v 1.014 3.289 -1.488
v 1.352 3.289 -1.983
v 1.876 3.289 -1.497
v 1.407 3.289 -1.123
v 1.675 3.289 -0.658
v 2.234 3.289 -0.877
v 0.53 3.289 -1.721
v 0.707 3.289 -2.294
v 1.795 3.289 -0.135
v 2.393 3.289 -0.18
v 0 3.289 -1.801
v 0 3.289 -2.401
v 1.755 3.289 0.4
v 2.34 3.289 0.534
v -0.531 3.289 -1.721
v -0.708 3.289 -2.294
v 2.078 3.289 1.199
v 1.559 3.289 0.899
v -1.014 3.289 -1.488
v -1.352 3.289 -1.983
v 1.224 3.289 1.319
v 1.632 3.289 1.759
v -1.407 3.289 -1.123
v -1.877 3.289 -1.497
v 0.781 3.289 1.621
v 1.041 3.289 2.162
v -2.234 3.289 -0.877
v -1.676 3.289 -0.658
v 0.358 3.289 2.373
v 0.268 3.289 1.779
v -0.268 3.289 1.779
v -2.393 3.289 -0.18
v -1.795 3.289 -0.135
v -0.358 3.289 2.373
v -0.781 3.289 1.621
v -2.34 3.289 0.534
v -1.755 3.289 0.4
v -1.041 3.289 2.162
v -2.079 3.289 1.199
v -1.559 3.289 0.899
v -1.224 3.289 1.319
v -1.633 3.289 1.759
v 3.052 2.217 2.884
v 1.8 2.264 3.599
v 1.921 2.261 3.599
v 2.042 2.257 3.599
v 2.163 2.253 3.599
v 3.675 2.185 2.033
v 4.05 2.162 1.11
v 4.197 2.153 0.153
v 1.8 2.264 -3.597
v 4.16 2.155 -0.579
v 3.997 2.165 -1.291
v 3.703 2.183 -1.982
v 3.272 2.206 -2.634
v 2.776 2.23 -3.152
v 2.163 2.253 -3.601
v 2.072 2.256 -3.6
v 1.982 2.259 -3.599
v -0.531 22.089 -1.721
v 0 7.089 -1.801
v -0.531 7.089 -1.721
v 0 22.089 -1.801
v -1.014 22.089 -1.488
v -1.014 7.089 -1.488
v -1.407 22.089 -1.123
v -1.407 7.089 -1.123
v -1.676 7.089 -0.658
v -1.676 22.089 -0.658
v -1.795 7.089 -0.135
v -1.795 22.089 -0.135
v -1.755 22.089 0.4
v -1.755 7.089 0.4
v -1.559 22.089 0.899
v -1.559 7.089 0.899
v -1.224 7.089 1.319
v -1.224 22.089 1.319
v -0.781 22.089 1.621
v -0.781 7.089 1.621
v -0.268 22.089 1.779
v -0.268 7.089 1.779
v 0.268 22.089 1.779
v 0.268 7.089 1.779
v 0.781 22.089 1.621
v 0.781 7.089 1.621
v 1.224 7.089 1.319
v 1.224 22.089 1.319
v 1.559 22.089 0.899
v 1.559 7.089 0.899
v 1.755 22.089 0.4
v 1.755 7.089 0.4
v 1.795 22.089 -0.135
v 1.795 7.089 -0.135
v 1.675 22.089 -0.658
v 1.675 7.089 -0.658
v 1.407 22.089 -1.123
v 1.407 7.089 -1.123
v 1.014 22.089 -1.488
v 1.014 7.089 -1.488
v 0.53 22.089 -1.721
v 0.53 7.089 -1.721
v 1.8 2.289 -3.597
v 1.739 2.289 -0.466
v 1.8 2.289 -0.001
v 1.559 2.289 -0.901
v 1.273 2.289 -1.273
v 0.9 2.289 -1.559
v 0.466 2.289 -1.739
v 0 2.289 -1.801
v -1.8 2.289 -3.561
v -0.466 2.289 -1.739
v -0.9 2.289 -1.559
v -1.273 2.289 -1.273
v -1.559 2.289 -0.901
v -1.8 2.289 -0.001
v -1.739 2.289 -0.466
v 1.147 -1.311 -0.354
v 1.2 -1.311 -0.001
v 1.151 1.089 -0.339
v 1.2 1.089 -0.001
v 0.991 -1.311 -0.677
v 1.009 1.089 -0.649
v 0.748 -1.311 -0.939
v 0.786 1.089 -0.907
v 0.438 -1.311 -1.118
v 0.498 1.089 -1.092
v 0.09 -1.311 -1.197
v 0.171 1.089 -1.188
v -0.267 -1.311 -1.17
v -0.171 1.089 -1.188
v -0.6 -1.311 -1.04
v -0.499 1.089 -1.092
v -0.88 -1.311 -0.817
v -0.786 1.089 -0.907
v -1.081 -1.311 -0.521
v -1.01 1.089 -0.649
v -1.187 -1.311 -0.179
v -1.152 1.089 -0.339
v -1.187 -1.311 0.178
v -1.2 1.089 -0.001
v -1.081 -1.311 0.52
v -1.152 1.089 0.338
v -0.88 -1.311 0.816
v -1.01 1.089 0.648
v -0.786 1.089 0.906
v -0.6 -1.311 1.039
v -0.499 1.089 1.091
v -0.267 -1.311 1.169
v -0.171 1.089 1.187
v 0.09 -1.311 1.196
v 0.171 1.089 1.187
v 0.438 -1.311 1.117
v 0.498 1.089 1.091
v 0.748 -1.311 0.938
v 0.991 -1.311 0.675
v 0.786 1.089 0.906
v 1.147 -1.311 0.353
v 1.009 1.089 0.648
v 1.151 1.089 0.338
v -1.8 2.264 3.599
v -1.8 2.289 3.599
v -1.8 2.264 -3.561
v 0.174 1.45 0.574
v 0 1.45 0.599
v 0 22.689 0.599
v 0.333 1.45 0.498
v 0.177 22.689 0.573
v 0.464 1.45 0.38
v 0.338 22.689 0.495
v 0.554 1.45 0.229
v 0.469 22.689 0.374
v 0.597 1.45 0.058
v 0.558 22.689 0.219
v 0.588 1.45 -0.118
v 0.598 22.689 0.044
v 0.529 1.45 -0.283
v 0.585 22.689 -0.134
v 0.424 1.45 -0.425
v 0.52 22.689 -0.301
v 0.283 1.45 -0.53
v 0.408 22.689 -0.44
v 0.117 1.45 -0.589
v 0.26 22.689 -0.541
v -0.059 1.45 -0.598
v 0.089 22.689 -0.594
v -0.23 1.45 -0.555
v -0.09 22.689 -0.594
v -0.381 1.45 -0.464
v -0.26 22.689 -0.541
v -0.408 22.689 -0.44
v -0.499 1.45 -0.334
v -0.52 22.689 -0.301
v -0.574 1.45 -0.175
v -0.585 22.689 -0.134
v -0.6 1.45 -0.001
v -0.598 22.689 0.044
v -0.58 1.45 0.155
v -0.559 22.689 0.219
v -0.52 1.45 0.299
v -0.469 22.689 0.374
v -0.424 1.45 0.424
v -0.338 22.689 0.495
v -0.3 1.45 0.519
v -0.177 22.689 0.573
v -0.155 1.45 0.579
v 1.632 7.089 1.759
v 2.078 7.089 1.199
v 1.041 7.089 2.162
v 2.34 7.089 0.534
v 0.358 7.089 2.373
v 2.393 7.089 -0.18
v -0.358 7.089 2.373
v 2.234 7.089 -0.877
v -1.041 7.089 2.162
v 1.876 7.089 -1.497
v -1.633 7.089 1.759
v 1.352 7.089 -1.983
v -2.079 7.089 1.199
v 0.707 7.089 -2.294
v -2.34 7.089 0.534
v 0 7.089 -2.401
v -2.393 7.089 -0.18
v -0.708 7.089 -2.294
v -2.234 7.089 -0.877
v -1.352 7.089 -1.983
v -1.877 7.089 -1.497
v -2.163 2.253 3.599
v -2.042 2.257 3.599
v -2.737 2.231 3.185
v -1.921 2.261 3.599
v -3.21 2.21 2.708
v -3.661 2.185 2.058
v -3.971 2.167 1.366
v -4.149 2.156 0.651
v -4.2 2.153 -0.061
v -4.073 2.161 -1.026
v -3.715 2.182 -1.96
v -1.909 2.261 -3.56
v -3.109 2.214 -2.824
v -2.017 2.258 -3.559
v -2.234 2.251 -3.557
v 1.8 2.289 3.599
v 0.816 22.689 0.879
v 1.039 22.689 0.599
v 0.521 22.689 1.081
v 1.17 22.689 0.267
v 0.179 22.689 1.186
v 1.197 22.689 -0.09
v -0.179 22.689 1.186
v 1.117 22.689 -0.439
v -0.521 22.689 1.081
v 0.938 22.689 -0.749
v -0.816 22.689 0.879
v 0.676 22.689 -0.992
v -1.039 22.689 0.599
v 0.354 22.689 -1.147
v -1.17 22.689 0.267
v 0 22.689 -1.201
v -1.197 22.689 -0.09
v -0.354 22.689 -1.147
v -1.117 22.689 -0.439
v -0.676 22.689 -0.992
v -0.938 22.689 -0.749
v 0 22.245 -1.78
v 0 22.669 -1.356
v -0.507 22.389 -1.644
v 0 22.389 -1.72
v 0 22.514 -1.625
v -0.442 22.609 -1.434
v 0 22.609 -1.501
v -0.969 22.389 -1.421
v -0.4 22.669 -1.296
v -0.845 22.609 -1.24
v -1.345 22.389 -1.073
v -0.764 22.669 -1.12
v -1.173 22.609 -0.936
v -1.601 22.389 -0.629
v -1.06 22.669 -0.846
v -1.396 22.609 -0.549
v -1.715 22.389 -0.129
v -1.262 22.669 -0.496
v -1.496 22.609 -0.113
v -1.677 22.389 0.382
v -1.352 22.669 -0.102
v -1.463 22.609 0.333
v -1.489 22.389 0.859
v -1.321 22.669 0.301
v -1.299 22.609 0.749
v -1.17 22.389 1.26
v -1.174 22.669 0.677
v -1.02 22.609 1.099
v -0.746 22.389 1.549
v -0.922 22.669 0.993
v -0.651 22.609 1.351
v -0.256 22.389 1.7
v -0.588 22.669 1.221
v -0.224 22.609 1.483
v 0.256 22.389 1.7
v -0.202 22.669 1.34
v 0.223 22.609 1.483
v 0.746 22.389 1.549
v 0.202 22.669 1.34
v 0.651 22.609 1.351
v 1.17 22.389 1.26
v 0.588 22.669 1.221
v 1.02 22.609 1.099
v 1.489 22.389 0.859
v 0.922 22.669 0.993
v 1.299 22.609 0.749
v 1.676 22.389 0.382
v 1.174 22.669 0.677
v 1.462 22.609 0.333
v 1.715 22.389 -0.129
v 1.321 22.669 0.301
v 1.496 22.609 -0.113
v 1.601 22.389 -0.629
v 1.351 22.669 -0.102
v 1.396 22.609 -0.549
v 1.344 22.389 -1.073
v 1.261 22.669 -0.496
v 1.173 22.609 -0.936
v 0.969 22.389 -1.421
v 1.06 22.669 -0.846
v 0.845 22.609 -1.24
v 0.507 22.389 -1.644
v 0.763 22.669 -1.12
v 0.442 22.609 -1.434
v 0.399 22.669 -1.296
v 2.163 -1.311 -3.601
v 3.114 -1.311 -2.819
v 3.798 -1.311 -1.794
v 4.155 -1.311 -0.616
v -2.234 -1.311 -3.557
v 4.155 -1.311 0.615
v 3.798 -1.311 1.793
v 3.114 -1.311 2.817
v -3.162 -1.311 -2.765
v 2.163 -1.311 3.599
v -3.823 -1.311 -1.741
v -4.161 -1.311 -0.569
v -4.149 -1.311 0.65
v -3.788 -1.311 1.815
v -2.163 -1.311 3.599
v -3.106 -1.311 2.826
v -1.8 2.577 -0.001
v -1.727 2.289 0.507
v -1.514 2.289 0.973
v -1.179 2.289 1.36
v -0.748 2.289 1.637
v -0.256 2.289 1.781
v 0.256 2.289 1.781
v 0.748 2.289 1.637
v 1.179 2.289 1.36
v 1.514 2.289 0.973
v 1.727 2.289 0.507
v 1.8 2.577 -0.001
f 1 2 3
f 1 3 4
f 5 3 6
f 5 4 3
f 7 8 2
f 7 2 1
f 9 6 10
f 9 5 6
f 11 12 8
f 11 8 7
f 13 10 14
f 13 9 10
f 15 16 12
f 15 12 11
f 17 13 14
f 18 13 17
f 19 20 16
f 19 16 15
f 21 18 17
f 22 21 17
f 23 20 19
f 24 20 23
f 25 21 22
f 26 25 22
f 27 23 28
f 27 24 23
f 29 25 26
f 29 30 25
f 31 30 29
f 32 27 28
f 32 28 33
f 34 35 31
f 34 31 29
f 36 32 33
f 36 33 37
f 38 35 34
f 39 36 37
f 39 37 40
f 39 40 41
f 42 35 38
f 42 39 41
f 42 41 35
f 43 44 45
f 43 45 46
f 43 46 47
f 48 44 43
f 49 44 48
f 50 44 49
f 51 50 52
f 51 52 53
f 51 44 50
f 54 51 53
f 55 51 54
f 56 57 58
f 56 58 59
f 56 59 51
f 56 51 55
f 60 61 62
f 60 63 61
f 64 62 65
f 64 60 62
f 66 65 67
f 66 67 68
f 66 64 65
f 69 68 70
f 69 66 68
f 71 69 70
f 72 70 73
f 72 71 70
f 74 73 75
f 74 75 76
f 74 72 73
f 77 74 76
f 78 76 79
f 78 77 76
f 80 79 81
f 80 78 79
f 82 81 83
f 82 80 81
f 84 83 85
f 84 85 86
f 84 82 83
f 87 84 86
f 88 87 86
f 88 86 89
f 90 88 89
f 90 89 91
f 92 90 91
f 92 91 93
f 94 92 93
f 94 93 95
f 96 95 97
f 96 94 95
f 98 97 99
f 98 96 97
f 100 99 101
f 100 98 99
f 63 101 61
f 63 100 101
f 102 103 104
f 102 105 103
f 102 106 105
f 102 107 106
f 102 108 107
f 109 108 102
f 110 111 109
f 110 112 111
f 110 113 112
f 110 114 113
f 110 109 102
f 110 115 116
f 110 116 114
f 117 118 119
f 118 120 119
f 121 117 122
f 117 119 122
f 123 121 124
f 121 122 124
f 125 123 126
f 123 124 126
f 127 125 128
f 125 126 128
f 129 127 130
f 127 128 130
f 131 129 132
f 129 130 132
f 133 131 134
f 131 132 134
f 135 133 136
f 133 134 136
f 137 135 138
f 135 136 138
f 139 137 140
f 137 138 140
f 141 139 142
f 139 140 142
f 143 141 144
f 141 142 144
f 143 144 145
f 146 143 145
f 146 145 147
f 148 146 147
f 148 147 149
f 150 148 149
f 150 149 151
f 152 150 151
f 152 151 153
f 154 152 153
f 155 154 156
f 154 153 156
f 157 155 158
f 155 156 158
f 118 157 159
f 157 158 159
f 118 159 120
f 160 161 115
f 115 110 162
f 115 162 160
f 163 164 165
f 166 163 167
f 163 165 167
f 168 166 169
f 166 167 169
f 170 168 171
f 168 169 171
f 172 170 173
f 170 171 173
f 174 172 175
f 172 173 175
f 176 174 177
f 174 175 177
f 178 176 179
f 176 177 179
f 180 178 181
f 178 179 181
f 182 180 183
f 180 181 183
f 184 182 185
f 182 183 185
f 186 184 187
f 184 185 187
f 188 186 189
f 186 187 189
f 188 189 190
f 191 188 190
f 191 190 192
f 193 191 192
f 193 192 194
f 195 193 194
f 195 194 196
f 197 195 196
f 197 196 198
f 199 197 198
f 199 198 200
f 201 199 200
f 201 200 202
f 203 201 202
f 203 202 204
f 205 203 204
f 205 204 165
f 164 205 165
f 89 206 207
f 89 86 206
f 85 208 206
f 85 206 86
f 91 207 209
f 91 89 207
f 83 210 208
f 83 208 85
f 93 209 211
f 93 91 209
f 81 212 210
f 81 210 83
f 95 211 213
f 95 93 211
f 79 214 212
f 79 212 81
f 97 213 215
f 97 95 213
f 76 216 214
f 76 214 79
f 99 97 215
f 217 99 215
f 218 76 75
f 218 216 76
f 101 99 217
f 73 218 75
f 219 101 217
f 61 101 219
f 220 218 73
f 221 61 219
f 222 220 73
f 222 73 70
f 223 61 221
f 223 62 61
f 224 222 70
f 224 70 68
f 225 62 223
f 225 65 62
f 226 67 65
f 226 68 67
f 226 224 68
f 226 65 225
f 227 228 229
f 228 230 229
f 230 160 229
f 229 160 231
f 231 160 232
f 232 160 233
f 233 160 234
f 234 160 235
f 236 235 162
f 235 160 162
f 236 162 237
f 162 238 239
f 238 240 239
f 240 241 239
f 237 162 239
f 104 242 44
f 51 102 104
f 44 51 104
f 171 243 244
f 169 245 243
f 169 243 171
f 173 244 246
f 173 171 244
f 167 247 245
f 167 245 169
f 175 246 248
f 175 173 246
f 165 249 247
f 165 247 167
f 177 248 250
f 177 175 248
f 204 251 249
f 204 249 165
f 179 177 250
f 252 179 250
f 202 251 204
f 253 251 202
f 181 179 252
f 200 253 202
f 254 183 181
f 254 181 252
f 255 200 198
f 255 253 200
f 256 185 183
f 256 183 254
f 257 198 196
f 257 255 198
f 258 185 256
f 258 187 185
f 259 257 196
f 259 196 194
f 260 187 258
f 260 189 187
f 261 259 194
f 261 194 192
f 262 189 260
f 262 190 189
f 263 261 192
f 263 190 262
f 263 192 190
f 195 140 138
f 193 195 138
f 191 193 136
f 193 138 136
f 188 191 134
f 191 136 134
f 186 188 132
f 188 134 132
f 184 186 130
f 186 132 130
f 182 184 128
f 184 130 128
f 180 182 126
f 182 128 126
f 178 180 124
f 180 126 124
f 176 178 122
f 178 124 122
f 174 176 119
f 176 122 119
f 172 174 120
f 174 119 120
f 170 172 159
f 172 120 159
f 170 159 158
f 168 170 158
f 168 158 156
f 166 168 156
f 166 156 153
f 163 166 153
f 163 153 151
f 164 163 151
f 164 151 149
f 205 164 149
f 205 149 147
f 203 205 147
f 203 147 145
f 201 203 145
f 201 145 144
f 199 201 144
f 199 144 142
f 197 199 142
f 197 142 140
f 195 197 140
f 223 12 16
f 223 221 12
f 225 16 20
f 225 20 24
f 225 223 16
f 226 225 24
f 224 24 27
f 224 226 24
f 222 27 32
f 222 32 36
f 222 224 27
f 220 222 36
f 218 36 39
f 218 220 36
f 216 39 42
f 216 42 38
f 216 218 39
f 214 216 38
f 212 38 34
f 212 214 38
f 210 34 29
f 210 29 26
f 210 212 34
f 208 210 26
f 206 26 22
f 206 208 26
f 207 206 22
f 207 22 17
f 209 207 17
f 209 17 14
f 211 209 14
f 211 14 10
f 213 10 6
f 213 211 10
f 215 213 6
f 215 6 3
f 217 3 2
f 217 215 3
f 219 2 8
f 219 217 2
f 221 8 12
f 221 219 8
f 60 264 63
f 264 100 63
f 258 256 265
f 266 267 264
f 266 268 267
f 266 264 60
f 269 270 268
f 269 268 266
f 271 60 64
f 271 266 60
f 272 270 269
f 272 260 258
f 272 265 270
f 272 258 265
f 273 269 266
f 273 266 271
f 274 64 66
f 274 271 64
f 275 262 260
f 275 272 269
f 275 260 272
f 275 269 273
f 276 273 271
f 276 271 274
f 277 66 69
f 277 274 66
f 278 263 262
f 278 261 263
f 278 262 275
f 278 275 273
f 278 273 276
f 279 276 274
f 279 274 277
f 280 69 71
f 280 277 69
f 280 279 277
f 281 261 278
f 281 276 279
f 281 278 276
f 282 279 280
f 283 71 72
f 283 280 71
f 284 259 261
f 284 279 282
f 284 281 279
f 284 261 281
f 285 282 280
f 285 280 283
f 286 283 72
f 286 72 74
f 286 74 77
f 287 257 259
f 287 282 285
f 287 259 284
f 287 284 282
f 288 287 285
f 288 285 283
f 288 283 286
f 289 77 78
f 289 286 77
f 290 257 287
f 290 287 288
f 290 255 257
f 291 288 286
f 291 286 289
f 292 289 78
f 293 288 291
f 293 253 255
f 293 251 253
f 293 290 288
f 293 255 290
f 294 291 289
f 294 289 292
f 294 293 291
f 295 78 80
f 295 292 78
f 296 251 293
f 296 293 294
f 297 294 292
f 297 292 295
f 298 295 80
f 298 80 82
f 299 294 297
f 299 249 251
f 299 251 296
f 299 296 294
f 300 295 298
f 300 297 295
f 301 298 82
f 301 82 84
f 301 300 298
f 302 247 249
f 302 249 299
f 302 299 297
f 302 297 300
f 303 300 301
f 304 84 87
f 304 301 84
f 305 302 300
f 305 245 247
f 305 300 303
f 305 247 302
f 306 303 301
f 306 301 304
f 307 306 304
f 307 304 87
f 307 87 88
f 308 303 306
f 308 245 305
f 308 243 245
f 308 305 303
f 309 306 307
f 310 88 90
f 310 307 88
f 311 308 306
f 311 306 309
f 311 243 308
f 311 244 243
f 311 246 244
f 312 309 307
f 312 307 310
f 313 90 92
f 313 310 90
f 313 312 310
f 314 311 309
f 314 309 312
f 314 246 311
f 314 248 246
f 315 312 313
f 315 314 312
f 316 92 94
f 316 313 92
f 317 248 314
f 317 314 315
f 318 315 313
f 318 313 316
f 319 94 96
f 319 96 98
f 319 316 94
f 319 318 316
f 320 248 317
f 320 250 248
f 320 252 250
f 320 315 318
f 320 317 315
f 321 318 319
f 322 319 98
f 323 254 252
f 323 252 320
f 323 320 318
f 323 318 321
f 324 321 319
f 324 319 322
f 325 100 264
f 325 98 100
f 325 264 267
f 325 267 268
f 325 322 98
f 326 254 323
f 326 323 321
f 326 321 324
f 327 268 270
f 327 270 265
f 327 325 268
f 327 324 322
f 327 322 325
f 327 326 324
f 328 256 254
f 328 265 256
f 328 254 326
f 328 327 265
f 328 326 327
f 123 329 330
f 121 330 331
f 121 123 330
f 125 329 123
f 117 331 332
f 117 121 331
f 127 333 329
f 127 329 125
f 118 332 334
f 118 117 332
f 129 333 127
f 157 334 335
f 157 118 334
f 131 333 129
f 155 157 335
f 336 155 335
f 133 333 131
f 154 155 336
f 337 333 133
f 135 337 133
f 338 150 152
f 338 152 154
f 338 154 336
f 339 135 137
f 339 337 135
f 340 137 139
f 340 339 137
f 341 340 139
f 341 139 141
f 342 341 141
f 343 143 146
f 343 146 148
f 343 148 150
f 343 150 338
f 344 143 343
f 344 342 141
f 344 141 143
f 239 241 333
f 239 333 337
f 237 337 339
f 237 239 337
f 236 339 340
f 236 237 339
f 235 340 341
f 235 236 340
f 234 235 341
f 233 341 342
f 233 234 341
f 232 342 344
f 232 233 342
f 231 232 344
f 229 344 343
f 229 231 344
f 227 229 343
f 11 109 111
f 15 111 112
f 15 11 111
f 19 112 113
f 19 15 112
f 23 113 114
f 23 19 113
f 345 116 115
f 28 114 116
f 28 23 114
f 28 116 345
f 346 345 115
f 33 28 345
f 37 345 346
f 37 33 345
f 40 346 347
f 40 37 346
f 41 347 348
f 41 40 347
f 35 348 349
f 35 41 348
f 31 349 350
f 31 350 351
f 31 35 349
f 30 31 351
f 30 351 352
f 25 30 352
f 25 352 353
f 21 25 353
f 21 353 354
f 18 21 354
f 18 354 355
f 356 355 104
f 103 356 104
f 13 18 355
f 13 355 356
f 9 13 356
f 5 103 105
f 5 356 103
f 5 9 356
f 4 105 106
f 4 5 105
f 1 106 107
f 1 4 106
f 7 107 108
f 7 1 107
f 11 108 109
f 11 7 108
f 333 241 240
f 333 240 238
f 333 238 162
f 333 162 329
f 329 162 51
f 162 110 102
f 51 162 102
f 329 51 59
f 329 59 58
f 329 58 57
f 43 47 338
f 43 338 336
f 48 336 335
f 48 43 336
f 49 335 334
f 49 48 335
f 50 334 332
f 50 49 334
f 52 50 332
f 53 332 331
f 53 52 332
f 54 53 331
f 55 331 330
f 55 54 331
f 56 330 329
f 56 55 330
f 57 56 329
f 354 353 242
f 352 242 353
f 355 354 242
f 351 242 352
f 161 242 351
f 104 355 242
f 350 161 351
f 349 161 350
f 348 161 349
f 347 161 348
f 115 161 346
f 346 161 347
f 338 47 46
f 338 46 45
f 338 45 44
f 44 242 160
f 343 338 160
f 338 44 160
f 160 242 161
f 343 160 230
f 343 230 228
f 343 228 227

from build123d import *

# Parameters (mm, degrees)
SKETCH2_R                 = 0.5
CUT_EXTRUDE2_DEPTH        = 21.603397778
F_2_0MM_DOWEL_HOLE1_D     = 2
F_2_0MM_DOWEL_HOLE1_DEPTH = 2
F_2_0MM_DOWEL_HOLE1_TIP   = 0.600860619
CUT_EXTRUDE3_DEPTH        = 21.603397778
CUT_EXTRUDE4_DEPTH        = 5
CUT_EXTRUDE4_DEPTH_BACK   = 18
SCALE1_SCALE              = 1.2


with BuildPart() as part:
    # Sketch1 → Revolve2 (revolve)
    with BuildSketch(Plane.XY, mode=Mode.PRIVATE) as revolve2_sk:
        with BuildLine():
            Line((0, 0), (-3.5, 0))
            Line((-3.5, 0), (-3.5, 3))
            Line((-3.5, 3), (-1.5, 3))
            Line((-1.5, 3), (-1.5, 3.833209081))
            Line((-1.5, 3.833209081), (-2, 3.833209081))
            Line((-2, 3.833209081), (-2, 7))
            Line((-2, 7), (-1.5, 7))
            Line((-1.5, 7), (-1.5, 19.5))
            ThreePointArc((-1.5, 19.5), (-1.353553391, 19.853553391), (-1, 20))
            Line((-1, 20), (0, 20))
            Line((0, 20), (0, 0))
        make_face()
    revolve(revolve2_sk.sketch.rotate(Axis((0, 7, 0), (0, 1, 0)), 270), axis=Axis((0, 7, 0), (0, 1, 0)))

    # Sketch2 → Cut-Extrude2 (cut, through all)
    with BuildSketch(Plane(origin=(0, 20, 0), x_dir=(1, 0, 0), z_dir=(0, 1, 0))):
        with Locations(Location((0, 0, 0), (0, 0, 270))):
            Circle(SKETCH2_R)
    extrude(amount=-CUT_EXTRUDE2_DEPTH, mode=Mode.SUBTRACT)

    # Ø2.0mm Dowel Hole1
    with Locations(Plane(origin=(0, 0, 0), x_dir=(-1, 0, 0), z_dir=(0, -1, 0))):
        with Locations((0, 0)):
            Hole(F_2_0MM_DOWEL_HOLE1_D / 2, depth=F_2_0MM_DOWEL_HOLE1_DEPTH)
            with Locations((0, 0, -(F_2_0MM_DOWEL_HOLE1_DEPTH + F_2_0MM_DOWEL_HOLE1_TIP / 2))):  # 118° drill point
                Cone(0, F_2_0MM_DOWEL_HOLE1_D / 2, F_2_0MM_DOWEL_HOLE1_TIP, mode=Mode.SUBTRACT)

    # Sketch6 → Cut-Extrude3 (cut, through all)
    with BuildSketch(Plane(origin=(0, 20, 0), x_dir=(1, 0, 0), z_dir=(0, 1, 0))):
        with BuildLine():
            Line((1.802775638, -3), (-1.802775638, -3))
            ThreePointArc((-1.802775638, -3), (0, -3.5), (1.802775638, -3))
        make_face()
        with BuildLine():
            Line((-1.861759264, 2.963756475), (1.802775638, 3))
            ThreePointArc((1.802775638, 3), (-0.034614525, 3.499828829), (-1.861759264, 2.963756475))
        make_face()
    extrude(amount=-CUT_EXTRUDE3_DEPTH, mode=Mode.SUBTRACT)

    # Sketch7 → Cut-Extrude4 (cut, two sides: drawn at the far end of the back side and taken through both)
    with BuildSketch(Plane.XY.offset(-CUT_EXTRUDE4_DEPTH_BACK)):
        with BuildLine():
            Line((-4.156062939, 2.838931077), (-4.156062939, 3.239498592))
            Line((-4.156062939, 3.239498592), (-1.5, 3.239498592))
            Line((-1.5, 3.239498592), (-1.5, 2.979046191))
            ThreePointArc((-1.5, 2.979046191), (-2.828899089, 2.925435476), (-4.156062939, 2.838931077))
        make_face()
        with BuildLine():
            Line((4.156062939, 3.239498592), (1.5, 3.239498592))
            Line((1.5, 3.239498592), (1.5, 2.979046191))
            ThreePointArc((1.5, 2.979046191), (2.828899089, 2.925435476), (4.156062939, 2.838931077))
            Line((4.156062939, 2.838931077), (4.156062939, 3.239498592))
        make_face()
    extrude(amount=CUT_EXTRUDE4_DEPTH + CUT_EXTRUDE4_DEPTH_BACK, mode=Mode.SUBTRACT)


with BuildPart() as part_1:
    # Scale1: scaled about (0.000542722, 6.55250098, 0.00261842)
    add(part.part.scale(SCALE1_SCALE).moved(Location((-0.000108544, -1.310500196, -0.000523684))))


solid = part_1.part
